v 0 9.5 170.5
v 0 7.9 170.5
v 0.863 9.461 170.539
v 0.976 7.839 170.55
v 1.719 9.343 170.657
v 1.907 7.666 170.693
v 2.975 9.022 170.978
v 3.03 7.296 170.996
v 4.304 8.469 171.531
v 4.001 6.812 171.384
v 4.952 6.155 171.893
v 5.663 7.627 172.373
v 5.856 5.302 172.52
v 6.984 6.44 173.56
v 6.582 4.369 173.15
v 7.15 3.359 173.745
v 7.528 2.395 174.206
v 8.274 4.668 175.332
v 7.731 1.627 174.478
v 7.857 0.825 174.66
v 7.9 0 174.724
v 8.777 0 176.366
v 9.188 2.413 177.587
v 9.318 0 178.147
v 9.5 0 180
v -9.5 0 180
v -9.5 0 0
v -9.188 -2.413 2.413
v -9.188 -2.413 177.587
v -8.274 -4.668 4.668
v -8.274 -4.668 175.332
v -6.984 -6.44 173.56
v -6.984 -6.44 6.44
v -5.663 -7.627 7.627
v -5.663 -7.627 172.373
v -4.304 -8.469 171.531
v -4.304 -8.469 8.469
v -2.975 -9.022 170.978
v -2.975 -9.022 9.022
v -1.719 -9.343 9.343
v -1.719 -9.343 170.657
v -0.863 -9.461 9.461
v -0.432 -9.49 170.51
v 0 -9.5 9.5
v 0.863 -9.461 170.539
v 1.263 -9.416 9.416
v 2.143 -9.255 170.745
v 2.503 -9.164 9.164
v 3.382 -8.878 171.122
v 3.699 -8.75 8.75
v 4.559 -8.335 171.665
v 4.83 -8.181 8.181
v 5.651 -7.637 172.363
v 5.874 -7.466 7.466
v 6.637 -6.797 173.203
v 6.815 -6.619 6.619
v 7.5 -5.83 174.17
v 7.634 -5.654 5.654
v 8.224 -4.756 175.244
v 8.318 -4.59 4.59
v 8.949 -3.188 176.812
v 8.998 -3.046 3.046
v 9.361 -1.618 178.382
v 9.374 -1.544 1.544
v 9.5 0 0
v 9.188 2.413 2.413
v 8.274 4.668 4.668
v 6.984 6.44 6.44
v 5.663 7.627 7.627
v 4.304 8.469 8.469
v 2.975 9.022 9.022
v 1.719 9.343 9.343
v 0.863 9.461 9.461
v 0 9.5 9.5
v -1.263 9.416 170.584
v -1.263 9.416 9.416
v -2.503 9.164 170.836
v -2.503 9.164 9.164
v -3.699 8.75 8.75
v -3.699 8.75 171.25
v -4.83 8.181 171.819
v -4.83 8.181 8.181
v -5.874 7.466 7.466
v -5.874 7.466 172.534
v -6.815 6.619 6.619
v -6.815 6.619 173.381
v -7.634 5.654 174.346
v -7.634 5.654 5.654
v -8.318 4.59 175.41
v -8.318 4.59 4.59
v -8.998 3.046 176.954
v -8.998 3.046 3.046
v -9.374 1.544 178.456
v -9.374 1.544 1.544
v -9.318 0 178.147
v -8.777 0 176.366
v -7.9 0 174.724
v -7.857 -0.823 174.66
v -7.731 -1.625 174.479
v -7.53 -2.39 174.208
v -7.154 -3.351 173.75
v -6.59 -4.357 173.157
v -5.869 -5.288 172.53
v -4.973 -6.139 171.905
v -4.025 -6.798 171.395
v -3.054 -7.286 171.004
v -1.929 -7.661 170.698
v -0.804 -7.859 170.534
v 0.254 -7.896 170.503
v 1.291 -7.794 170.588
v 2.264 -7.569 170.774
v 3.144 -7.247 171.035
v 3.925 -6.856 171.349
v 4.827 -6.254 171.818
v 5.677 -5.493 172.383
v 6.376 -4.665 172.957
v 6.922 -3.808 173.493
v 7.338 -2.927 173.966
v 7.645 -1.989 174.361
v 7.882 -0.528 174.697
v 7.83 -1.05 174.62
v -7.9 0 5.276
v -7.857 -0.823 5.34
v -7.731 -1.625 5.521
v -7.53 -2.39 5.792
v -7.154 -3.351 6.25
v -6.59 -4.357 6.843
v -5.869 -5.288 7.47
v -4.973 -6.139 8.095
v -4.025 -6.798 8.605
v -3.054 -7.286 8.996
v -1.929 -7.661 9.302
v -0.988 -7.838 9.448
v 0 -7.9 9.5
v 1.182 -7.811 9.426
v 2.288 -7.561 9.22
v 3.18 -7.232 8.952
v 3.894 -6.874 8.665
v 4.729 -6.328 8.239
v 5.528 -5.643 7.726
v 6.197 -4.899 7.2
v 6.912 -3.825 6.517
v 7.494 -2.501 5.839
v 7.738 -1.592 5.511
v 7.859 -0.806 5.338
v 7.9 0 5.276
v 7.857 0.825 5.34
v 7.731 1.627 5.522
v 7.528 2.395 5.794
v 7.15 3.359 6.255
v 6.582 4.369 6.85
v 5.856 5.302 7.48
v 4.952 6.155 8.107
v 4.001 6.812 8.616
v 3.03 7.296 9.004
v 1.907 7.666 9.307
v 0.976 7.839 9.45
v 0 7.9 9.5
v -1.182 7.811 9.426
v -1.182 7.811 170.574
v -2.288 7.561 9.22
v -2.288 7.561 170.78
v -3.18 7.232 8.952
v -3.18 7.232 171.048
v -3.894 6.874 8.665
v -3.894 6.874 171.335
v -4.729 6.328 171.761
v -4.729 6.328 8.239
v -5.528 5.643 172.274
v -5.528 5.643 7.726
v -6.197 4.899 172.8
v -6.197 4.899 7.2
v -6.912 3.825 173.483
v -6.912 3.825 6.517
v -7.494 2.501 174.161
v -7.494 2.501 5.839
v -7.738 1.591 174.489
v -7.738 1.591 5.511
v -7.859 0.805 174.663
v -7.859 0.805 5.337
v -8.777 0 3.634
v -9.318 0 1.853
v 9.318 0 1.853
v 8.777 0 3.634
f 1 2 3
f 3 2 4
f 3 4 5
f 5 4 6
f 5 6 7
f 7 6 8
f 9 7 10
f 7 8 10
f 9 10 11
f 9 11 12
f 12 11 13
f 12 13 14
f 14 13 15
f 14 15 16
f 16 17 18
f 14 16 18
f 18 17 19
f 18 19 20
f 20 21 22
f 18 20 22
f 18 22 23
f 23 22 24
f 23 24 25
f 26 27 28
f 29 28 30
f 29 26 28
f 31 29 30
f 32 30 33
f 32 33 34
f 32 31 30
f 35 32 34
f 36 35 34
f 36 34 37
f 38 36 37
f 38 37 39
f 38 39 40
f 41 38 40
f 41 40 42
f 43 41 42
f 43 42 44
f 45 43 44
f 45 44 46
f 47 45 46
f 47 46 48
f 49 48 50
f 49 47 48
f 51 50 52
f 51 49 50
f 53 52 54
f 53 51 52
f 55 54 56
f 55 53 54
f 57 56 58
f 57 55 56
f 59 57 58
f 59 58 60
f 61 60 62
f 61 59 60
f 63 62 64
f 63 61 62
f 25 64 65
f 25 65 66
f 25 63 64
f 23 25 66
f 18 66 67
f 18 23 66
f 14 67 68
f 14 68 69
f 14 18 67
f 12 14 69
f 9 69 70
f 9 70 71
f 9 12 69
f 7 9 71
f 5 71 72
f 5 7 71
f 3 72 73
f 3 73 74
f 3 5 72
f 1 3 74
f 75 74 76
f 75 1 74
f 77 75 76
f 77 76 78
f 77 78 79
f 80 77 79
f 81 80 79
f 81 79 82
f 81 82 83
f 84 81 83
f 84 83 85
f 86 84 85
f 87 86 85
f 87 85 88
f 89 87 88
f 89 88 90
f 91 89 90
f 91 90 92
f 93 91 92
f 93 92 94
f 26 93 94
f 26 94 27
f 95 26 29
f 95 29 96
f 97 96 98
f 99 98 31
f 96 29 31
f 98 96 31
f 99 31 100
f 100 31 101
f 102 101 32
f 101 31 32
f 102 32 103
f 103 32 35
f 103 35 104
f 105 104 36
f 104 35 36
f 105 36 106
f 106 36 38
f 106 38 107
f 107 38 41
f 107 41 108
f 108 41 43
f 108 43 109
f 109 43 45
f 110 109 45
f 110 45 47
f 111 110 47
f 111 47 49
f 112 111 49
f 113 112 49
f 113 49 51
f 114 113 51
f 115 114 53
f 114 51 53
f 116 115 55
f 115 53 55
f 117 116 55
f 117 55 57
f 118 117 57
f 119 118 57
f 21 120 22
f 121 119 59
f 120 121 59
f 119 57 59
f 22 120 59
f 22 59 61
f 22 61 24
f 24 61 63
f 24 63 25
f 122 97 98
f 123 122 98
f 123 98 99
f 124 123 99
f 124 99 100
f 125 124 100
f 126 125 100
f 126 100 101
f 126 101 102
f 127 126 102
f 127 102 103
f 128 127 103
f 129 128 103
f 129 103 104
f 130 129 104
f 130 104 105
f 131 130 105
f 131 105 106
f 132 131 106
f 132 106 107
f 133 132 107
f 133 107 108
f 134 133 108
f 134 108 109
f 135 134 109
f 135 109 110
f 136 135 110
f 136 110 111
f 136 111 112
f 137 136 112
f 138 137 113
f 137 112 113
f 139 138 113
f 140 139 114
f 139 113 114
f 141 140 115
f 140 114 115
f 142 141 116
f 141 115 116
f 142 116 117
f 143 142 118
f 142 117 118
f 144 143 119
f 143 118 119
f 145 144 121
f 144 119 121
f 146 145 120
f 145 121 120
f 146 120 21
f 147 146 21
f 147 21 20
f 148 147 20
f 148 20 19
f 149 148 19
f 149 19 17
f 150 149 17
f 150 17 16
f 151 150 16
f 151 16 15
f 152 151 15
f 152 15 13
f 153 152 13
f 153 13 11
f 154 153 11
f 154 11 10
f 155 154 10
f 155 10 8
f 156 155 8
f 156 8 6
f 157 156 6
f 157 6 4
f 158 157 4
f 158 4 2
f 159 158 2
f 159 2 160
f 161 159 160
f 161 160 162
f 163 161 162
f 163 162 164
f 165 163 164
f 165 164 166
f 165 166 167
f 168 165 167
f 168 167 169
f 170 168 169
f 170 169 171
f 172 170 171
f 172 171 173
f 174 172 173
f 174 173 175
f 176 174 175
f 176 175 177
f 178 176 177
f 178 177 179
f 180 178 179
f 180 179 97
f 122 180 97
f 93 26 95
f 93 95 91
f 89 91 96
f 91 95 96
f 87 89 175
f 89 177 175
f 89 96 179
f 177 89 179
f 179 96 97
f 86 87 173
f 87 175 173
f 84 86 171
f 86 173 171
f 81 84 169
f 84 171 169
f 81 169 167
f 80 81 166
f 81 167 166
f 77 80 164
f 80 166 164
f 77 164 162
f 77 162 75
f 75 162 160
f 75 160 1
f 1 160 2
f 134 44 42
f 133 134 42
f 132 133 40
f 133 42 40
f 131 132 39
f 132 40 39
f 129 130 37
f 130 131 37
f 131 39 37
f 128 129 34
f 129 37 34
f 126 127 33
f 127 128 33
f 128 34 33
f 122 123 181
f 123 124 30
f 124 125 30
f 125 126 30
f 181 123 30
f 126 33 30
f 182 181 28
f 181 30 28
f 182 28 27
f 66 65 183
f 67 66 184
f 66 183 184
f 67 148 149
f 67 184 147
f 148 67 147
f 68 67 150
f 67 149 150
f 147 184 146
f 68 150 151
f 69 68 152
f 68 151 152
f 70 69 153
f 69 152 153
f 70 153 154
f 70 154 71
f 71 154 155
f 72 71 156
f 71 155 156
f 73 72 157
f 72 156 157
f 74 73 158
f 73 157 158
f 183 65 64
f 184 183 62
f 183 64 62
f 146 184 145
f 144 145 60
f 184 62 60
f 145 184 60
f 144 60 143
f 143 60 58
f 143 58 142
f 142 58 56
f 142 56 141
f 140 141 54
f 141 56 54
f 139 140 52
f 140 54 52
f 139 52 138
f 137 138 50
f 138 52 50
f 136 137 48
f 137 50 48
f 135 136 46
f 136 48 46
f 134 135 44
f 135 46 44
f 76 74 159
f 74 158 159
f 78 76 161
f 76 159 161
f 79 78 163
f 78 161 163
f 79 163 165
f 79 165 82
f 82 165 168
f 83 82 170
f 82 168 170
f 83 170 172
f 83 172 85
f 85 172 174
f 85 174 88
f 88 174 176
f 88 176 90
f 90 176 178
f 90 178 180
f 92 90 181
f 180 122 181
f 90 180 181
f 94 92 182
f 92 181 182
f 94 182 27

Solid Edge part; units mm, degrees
sketch "Sketch1" plane through (0, 0, 0) normal (0, -1, 0) x (1, 0, 0)
  line L0 (0, 0) -> (0, 180)
  dimension "D1" = 180
sketch "Sketch2" plane through (0, 0, 0) normal (0, 0, -1) x (-1, 0, 0)
  circle A0 centre (0, 0) radius 9.5
  dimension "D1" = 19
sweep "SweptProtrusion_1" add profiles "Sketch2" path "Sketch1"
shell "Thinwall_1" thickness 1.6 removed faces 2 at (6.5233, -6.1433, 0) at (6.5233, -6.1433, 180)
hole "Hole_1" at (0, 0, 0) direction (0, -1, 0) diameter 19 end through all both ways yes
hole "Hole1" at (0, 0, 180) direction (0, -1, 0) diameter 19 end through all both ways yes
properties material "Aluminum, 1060"
